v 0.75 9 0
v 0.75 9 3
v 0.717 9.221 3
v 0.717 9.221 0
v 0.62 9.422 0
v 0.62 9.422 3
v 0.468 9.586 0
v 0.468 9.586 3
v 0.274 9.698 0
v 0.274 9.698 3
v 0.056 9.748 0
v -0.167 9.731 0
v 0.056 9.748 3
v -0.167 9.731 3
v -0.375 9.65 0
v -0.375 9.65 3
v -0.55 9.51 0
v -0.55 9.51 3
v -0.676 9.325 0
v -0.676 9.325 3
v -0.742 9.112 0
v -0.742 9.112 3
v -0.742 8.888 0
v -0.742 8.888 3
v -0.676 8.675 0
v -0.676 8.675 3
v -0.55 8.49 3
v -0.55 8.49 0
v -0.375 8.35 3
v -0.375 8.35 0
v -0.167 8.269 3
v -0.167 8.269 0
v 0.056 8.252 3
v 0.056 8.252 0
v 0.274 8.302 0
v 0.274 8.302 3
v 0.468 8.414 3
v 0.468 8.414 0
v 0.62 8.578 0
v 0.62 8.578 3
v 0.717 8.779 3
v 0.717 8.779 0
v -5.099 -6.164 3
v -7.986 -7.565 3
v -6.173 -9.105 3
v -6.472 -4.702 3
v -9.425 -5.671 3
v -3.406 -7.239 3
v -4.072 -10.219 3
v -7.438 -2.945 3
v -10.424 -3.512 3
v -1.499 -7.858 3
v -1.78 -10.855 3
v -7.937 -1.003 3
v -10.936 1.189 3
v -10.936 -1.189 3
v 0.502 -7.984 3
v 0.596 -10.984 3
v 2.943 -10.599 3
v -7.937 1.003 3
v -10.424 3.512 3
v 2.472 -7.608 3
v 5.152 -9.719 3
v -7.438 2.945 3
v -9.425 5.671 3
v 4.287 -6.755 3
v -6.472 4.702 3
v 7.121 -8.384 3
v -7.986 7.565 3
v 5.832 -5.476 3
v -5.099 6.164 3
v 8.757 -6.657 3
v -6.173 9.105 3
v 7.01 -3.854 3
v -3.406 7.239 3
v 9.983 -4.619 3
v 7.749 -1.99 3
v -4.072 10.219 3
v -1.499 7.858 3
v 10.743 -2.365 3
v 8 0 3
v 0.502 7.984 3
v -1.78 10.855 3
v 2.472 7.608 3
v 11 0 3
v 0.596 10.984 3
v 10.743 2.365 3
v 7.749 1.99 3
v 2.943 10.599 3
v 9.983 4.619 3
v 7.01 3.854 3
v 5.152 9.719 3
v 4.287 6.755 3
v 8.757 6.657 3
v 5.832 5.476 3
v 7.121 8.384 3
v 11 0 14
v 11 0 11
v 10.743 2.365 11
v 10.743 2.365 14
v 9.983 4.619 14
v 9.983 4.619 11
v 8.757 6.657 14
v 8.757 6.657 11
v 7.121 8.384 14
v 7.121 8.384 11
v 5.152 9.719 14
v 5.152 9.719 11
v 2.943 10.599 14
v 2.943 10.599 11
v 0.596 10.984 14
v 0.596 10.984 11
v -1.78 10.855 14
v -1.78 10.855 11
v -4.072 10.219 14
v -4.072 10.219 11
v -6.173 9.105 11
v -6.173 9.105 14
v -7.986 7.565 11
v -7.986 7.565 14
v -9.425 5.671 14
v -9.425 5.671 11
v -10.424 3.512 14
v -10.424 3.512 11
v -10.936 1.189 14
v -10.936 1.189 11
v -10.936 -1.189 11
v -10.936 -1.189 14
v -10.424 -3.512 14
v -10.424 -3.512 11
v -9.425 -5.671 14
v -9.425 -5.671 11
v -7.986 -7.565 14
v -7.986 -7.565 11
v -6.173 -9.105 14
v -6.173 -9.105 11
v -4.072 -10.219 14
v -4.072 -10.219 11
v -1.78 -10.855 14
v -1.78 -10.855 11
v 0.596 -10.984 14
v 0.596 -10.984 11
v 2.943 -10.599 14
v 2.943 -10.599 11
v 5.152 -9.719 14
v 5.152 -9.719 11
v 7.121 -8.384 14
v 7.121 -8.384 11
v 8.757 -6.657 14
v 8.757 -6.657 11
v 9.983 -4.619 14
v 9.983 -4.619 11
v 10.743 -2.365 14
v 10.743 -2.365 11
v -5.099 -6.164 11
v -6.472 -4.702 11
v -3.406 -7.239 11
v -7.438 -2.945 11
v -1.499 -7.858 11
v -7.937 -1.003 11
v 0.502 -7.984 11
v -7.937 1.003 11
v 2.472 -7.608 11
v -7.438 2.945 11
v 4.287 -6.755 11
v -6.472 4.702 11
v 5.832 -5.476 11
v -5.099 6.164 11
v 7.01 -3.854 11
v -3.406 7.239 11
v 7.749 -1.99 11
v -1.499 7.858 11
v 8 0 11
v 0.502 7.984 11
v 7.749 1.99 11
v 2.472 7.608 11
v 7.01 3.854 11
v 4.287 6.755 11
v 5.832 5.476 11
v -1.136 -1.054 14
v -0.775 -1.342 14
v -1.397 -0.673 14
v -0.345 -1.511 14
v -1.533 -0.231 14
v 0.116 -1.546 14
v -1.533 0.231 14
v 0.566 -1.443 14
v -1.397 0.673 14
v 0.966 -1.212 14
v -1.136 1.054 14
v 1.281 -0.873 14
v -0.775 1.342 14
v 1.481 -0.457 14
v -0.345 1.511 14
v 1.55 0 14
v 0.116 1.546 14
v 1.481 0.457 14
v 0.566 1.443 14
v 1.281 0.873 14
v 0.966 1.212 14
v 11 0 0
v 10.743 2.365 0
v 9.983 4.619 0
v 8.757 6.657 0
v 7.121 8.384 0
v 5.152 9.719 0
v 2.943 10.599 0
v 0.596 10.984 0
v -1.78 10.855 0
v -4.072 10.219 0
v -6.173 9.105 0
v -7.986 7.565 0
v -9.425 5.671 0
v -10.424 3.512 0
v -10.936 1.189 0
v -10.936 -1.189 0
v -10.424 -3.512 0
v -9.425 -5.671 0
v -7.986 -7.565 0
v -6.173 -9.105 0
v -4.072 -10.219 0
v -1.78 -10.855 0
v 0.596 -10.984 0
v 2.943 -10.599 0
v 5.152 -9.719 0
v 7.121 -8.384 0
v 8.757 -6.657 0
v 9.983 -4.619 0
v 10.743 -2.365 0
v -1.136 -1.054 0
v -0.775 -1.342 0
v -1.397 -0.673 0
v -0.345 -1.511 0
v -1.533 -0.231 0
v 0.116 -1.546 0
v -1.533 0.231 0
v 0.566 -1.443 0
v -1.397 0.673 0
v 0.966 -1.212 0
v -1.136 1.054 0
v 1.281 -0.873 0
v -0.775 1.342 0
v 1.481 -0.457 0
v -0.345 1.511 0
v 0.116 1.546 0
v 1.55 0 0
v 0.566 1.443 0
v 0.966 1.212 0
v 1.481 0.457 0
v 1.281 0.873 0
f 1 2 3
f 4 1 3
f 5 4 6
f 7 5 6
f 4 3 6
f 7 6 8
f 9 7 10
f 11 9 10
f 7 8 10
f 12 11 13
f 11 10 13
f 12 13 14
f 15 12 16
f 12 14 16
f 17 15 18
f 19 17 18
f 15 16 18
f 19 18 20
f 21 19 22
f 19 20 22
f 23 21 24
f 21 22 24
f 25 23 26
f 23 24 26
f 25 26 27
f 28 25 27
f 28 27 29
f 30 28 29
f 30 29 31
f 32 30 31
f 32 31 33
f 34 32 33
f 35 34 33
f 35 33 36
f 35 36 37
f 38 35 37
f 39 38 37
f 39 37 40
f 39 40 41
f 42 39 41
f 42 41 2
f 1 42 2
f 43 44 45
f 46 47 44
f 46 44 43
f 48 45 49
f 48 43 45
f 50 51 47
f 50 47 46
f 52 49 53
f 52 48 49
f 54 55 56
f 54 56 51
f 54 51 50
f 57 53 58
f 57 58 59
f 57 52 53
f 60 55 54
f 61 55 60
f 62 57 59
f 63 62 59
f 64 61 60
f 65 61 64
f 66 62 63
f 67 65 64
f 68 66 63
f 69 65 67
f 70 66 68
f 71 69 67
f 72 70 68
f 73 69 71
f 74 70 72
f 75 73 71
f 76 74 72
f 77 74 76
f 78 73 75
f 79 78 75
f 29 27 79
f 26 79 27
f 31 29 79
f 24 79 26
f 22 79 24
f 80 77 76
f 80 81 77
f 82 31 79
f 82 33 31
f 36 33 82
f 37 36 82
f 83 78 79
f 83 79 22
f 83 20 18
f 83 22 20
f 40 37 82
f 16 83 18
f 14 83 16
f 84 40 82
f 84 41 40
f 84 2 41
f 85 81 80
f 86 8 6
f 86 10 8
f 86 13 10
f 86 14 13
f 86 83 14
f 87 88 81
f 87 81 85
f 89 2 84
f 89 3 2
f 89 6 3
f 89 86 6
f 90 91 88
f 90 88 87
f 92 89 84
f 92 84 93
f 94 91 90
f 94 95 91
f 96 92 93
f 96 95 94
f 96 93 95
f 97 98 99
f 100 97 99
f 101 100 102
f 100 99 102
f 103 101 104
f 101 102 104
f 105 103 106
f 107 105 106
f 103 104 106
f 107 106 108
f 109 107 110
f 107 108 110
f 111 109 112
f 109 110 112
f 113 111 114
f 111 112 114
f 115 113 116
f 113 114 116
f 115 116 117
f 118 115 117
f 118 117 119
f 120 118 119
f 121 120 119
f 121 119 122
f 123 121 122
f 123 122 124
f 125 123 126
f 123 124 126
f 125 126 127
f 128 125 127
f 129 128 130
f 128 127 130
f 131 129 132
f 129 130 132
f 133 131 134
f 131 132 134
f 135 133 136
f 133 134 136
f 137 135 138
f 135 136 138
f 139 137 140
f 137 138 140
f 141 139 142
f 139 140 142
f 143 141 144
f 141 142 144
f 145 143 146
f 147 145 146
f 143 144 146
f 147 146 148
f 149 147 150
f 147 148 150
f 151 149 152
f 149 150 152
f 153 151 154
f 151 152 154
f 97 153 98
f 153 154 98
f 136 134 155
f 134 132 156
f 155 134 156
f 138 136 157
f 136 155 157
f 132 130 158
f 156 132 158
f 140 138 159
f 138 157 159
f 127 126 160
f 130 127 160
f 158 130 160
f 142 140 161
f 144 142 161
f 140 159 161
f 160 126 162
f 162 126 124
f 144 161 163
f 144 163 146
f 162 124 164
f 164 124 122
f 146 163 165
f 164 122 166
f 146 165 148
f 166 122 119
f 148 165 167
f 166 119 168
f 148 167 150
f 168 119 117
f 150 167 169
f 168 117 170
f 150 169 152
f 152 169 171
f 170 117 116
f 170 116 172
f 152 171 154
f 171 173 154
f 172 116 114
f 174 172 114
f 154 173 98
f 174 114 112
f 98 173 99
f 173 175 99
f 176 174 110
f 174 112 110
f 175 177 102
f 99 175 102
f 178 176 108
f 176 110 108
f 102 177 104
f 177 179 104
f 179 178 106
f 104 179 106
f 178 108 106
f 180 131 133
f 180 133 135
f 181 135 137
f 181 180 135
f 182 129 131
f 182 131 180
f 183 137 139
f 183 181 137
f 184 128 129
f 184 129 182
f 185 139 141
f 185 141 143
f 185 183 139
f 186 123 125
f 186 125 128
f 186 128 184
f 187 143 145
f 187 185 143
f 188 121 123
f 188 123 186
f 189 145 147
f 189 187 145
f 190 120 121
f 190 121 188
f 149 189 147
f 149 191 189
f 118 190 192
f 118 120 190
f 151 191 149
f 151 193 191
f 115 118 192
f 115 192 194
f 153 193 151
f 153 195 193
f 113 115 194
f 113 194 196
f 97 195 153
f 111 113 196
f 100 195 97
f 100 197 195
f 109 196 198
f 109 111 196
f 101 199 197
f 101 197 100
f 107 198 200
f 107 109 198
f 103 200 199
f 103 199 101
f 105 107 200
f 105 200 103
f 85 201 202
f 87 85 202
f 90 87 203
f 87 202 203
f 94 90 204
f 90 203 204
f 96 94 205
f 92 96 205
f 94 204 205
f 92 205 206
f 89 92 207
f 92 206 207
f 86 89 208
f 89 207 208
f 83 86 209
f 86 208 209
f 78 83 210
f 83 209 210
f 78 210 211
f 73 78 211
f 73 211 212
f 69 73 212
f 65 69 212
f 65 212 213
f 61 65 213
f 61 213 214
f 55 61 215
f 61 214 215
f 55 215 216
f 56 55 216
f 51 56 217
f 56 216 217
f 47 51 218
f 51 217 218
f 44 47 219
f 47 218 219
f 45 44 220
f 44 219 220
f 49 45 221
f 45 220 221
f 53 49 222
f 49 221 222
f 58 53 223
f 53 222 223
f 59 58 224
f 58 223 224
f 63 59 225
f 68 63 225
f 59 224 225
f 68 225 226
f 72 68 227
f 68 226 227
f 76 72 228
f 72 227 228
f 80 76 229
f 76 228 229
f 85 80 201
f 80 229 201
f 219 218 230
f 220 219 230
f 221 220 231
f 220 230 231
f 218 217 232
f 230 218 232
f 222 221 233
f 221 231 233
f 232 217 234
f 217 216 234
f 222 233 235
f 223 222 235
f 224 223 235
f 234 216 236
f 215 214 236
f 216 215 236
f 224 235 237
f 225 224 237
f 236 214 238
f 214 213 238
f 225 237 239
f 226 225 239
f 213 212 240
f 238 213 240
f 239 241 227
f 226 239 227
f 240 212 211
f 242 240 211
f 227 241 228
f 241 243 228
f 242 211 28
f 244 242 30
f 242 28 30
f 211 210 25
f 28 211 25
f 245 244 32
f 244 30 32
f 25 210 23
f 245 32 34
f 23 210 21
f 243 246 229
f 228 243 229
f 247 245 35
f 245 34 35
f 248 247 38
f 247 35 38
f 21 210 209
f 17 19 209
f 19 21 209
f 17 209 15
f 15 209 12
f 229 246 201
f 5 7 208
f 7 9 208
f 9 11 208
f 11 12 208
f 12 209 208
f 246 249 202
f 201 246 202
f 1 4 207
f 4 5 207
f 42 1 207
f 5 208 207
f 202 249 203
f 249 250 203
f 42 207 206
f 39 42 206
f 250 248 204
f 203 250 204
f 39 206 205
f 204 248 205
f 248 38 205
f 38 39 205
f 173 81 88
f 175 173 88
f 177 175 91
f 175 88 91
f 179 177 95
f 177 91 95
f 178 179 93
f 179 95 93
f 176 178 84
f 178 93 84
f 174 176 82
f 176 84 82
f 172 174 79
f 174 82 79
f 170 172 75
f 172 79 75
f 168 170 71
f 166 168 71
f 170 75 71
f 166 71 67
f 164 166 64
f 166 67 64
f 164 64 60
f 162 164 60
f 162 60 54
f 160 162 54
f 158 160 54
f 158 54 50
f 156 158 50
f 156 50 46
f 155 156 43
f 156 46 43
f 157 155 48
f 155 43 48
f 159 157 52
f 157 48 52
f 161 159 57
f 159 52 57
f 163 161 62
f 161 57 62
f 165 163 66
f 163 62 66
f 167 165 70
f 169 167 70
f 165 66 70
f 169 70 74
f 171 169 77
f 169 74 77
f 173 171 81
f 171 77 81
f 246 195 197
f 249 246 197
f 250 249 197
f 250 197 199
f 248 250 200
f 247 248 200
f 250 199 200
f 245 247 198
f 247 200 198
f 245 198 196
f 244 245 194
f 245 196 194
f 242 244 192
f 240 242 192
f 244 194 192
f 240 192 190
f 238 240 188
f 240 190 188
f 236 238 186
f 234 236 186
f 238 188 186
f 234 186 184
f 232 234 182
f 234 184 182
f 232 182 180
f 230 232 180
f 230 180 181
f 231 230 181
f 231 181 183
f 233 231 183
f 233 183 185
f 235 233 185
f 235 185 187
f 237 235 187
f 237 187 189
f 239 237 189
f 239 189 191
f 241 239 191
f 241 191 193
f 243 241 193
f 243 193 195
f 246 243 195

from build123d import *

# Parameters (mm, degrees)
SKETCH1_R           = 11
BOSS_EXTRUDE1_DEPTH = 3
SKETCH2_R           = 8
BOSS_EXTRUDE2_DEPTH = 8
SKETCH3_R           = 11
BOSS_EXTRUDE3_DEPTH = 3
SKETCH4_R           = 1.55
CUT_EXTRUDE1_DEPTH  = 15
SKETCH5_R           = 0.75
CUT_EXTRUDE2_DEPTH  = 4


with BuildPart() as part:
    # Sketch1 → Boss-Extrude1 (new body)
    with BuildSketch(Plane.XY):
        Circle(SKETCH1_R)
    extrude(amount=BOSS_EXTRUDE1_DEPTH)

    # Sketch2 → Boss-Extrude2 (add)
    with BuildSketch(Plane.XY.offset(3)):
        Circle(SKETCH2_R)
    extrude(amount=BOSS_EXTRUDE2_DEPTH)

    # Sketch3 → Boss-Extrude3 (add)
    with BuildSketch(Plane.XY.offset(11)):
        Circle(SKETCH3_R)
    extrude(amount=BOSS_EXTRUDE3_DEPTH)

    # Sketch4 → Cut-Extrude1 (cut, through all)
    with BuildSketch(Plane.XY.offset(14)):
        Circle(SKETCH4_R)
    extrude(amount=-CUT_EXTRUDE1_DEPTH, mode=Mode.SUBTRACT)

    # Sketch5 → Cut-Extrude2 (cut, through all)
    with BuildSketch(Plane.XY.offset(3)):
        with Locations((0, 9)):
            Circle(SKETCH5_R)
    extrude(amount=-CUT_EXTRUDE2_DEPTH, mode=Mode.SUBTRACT)


solid = part.part
